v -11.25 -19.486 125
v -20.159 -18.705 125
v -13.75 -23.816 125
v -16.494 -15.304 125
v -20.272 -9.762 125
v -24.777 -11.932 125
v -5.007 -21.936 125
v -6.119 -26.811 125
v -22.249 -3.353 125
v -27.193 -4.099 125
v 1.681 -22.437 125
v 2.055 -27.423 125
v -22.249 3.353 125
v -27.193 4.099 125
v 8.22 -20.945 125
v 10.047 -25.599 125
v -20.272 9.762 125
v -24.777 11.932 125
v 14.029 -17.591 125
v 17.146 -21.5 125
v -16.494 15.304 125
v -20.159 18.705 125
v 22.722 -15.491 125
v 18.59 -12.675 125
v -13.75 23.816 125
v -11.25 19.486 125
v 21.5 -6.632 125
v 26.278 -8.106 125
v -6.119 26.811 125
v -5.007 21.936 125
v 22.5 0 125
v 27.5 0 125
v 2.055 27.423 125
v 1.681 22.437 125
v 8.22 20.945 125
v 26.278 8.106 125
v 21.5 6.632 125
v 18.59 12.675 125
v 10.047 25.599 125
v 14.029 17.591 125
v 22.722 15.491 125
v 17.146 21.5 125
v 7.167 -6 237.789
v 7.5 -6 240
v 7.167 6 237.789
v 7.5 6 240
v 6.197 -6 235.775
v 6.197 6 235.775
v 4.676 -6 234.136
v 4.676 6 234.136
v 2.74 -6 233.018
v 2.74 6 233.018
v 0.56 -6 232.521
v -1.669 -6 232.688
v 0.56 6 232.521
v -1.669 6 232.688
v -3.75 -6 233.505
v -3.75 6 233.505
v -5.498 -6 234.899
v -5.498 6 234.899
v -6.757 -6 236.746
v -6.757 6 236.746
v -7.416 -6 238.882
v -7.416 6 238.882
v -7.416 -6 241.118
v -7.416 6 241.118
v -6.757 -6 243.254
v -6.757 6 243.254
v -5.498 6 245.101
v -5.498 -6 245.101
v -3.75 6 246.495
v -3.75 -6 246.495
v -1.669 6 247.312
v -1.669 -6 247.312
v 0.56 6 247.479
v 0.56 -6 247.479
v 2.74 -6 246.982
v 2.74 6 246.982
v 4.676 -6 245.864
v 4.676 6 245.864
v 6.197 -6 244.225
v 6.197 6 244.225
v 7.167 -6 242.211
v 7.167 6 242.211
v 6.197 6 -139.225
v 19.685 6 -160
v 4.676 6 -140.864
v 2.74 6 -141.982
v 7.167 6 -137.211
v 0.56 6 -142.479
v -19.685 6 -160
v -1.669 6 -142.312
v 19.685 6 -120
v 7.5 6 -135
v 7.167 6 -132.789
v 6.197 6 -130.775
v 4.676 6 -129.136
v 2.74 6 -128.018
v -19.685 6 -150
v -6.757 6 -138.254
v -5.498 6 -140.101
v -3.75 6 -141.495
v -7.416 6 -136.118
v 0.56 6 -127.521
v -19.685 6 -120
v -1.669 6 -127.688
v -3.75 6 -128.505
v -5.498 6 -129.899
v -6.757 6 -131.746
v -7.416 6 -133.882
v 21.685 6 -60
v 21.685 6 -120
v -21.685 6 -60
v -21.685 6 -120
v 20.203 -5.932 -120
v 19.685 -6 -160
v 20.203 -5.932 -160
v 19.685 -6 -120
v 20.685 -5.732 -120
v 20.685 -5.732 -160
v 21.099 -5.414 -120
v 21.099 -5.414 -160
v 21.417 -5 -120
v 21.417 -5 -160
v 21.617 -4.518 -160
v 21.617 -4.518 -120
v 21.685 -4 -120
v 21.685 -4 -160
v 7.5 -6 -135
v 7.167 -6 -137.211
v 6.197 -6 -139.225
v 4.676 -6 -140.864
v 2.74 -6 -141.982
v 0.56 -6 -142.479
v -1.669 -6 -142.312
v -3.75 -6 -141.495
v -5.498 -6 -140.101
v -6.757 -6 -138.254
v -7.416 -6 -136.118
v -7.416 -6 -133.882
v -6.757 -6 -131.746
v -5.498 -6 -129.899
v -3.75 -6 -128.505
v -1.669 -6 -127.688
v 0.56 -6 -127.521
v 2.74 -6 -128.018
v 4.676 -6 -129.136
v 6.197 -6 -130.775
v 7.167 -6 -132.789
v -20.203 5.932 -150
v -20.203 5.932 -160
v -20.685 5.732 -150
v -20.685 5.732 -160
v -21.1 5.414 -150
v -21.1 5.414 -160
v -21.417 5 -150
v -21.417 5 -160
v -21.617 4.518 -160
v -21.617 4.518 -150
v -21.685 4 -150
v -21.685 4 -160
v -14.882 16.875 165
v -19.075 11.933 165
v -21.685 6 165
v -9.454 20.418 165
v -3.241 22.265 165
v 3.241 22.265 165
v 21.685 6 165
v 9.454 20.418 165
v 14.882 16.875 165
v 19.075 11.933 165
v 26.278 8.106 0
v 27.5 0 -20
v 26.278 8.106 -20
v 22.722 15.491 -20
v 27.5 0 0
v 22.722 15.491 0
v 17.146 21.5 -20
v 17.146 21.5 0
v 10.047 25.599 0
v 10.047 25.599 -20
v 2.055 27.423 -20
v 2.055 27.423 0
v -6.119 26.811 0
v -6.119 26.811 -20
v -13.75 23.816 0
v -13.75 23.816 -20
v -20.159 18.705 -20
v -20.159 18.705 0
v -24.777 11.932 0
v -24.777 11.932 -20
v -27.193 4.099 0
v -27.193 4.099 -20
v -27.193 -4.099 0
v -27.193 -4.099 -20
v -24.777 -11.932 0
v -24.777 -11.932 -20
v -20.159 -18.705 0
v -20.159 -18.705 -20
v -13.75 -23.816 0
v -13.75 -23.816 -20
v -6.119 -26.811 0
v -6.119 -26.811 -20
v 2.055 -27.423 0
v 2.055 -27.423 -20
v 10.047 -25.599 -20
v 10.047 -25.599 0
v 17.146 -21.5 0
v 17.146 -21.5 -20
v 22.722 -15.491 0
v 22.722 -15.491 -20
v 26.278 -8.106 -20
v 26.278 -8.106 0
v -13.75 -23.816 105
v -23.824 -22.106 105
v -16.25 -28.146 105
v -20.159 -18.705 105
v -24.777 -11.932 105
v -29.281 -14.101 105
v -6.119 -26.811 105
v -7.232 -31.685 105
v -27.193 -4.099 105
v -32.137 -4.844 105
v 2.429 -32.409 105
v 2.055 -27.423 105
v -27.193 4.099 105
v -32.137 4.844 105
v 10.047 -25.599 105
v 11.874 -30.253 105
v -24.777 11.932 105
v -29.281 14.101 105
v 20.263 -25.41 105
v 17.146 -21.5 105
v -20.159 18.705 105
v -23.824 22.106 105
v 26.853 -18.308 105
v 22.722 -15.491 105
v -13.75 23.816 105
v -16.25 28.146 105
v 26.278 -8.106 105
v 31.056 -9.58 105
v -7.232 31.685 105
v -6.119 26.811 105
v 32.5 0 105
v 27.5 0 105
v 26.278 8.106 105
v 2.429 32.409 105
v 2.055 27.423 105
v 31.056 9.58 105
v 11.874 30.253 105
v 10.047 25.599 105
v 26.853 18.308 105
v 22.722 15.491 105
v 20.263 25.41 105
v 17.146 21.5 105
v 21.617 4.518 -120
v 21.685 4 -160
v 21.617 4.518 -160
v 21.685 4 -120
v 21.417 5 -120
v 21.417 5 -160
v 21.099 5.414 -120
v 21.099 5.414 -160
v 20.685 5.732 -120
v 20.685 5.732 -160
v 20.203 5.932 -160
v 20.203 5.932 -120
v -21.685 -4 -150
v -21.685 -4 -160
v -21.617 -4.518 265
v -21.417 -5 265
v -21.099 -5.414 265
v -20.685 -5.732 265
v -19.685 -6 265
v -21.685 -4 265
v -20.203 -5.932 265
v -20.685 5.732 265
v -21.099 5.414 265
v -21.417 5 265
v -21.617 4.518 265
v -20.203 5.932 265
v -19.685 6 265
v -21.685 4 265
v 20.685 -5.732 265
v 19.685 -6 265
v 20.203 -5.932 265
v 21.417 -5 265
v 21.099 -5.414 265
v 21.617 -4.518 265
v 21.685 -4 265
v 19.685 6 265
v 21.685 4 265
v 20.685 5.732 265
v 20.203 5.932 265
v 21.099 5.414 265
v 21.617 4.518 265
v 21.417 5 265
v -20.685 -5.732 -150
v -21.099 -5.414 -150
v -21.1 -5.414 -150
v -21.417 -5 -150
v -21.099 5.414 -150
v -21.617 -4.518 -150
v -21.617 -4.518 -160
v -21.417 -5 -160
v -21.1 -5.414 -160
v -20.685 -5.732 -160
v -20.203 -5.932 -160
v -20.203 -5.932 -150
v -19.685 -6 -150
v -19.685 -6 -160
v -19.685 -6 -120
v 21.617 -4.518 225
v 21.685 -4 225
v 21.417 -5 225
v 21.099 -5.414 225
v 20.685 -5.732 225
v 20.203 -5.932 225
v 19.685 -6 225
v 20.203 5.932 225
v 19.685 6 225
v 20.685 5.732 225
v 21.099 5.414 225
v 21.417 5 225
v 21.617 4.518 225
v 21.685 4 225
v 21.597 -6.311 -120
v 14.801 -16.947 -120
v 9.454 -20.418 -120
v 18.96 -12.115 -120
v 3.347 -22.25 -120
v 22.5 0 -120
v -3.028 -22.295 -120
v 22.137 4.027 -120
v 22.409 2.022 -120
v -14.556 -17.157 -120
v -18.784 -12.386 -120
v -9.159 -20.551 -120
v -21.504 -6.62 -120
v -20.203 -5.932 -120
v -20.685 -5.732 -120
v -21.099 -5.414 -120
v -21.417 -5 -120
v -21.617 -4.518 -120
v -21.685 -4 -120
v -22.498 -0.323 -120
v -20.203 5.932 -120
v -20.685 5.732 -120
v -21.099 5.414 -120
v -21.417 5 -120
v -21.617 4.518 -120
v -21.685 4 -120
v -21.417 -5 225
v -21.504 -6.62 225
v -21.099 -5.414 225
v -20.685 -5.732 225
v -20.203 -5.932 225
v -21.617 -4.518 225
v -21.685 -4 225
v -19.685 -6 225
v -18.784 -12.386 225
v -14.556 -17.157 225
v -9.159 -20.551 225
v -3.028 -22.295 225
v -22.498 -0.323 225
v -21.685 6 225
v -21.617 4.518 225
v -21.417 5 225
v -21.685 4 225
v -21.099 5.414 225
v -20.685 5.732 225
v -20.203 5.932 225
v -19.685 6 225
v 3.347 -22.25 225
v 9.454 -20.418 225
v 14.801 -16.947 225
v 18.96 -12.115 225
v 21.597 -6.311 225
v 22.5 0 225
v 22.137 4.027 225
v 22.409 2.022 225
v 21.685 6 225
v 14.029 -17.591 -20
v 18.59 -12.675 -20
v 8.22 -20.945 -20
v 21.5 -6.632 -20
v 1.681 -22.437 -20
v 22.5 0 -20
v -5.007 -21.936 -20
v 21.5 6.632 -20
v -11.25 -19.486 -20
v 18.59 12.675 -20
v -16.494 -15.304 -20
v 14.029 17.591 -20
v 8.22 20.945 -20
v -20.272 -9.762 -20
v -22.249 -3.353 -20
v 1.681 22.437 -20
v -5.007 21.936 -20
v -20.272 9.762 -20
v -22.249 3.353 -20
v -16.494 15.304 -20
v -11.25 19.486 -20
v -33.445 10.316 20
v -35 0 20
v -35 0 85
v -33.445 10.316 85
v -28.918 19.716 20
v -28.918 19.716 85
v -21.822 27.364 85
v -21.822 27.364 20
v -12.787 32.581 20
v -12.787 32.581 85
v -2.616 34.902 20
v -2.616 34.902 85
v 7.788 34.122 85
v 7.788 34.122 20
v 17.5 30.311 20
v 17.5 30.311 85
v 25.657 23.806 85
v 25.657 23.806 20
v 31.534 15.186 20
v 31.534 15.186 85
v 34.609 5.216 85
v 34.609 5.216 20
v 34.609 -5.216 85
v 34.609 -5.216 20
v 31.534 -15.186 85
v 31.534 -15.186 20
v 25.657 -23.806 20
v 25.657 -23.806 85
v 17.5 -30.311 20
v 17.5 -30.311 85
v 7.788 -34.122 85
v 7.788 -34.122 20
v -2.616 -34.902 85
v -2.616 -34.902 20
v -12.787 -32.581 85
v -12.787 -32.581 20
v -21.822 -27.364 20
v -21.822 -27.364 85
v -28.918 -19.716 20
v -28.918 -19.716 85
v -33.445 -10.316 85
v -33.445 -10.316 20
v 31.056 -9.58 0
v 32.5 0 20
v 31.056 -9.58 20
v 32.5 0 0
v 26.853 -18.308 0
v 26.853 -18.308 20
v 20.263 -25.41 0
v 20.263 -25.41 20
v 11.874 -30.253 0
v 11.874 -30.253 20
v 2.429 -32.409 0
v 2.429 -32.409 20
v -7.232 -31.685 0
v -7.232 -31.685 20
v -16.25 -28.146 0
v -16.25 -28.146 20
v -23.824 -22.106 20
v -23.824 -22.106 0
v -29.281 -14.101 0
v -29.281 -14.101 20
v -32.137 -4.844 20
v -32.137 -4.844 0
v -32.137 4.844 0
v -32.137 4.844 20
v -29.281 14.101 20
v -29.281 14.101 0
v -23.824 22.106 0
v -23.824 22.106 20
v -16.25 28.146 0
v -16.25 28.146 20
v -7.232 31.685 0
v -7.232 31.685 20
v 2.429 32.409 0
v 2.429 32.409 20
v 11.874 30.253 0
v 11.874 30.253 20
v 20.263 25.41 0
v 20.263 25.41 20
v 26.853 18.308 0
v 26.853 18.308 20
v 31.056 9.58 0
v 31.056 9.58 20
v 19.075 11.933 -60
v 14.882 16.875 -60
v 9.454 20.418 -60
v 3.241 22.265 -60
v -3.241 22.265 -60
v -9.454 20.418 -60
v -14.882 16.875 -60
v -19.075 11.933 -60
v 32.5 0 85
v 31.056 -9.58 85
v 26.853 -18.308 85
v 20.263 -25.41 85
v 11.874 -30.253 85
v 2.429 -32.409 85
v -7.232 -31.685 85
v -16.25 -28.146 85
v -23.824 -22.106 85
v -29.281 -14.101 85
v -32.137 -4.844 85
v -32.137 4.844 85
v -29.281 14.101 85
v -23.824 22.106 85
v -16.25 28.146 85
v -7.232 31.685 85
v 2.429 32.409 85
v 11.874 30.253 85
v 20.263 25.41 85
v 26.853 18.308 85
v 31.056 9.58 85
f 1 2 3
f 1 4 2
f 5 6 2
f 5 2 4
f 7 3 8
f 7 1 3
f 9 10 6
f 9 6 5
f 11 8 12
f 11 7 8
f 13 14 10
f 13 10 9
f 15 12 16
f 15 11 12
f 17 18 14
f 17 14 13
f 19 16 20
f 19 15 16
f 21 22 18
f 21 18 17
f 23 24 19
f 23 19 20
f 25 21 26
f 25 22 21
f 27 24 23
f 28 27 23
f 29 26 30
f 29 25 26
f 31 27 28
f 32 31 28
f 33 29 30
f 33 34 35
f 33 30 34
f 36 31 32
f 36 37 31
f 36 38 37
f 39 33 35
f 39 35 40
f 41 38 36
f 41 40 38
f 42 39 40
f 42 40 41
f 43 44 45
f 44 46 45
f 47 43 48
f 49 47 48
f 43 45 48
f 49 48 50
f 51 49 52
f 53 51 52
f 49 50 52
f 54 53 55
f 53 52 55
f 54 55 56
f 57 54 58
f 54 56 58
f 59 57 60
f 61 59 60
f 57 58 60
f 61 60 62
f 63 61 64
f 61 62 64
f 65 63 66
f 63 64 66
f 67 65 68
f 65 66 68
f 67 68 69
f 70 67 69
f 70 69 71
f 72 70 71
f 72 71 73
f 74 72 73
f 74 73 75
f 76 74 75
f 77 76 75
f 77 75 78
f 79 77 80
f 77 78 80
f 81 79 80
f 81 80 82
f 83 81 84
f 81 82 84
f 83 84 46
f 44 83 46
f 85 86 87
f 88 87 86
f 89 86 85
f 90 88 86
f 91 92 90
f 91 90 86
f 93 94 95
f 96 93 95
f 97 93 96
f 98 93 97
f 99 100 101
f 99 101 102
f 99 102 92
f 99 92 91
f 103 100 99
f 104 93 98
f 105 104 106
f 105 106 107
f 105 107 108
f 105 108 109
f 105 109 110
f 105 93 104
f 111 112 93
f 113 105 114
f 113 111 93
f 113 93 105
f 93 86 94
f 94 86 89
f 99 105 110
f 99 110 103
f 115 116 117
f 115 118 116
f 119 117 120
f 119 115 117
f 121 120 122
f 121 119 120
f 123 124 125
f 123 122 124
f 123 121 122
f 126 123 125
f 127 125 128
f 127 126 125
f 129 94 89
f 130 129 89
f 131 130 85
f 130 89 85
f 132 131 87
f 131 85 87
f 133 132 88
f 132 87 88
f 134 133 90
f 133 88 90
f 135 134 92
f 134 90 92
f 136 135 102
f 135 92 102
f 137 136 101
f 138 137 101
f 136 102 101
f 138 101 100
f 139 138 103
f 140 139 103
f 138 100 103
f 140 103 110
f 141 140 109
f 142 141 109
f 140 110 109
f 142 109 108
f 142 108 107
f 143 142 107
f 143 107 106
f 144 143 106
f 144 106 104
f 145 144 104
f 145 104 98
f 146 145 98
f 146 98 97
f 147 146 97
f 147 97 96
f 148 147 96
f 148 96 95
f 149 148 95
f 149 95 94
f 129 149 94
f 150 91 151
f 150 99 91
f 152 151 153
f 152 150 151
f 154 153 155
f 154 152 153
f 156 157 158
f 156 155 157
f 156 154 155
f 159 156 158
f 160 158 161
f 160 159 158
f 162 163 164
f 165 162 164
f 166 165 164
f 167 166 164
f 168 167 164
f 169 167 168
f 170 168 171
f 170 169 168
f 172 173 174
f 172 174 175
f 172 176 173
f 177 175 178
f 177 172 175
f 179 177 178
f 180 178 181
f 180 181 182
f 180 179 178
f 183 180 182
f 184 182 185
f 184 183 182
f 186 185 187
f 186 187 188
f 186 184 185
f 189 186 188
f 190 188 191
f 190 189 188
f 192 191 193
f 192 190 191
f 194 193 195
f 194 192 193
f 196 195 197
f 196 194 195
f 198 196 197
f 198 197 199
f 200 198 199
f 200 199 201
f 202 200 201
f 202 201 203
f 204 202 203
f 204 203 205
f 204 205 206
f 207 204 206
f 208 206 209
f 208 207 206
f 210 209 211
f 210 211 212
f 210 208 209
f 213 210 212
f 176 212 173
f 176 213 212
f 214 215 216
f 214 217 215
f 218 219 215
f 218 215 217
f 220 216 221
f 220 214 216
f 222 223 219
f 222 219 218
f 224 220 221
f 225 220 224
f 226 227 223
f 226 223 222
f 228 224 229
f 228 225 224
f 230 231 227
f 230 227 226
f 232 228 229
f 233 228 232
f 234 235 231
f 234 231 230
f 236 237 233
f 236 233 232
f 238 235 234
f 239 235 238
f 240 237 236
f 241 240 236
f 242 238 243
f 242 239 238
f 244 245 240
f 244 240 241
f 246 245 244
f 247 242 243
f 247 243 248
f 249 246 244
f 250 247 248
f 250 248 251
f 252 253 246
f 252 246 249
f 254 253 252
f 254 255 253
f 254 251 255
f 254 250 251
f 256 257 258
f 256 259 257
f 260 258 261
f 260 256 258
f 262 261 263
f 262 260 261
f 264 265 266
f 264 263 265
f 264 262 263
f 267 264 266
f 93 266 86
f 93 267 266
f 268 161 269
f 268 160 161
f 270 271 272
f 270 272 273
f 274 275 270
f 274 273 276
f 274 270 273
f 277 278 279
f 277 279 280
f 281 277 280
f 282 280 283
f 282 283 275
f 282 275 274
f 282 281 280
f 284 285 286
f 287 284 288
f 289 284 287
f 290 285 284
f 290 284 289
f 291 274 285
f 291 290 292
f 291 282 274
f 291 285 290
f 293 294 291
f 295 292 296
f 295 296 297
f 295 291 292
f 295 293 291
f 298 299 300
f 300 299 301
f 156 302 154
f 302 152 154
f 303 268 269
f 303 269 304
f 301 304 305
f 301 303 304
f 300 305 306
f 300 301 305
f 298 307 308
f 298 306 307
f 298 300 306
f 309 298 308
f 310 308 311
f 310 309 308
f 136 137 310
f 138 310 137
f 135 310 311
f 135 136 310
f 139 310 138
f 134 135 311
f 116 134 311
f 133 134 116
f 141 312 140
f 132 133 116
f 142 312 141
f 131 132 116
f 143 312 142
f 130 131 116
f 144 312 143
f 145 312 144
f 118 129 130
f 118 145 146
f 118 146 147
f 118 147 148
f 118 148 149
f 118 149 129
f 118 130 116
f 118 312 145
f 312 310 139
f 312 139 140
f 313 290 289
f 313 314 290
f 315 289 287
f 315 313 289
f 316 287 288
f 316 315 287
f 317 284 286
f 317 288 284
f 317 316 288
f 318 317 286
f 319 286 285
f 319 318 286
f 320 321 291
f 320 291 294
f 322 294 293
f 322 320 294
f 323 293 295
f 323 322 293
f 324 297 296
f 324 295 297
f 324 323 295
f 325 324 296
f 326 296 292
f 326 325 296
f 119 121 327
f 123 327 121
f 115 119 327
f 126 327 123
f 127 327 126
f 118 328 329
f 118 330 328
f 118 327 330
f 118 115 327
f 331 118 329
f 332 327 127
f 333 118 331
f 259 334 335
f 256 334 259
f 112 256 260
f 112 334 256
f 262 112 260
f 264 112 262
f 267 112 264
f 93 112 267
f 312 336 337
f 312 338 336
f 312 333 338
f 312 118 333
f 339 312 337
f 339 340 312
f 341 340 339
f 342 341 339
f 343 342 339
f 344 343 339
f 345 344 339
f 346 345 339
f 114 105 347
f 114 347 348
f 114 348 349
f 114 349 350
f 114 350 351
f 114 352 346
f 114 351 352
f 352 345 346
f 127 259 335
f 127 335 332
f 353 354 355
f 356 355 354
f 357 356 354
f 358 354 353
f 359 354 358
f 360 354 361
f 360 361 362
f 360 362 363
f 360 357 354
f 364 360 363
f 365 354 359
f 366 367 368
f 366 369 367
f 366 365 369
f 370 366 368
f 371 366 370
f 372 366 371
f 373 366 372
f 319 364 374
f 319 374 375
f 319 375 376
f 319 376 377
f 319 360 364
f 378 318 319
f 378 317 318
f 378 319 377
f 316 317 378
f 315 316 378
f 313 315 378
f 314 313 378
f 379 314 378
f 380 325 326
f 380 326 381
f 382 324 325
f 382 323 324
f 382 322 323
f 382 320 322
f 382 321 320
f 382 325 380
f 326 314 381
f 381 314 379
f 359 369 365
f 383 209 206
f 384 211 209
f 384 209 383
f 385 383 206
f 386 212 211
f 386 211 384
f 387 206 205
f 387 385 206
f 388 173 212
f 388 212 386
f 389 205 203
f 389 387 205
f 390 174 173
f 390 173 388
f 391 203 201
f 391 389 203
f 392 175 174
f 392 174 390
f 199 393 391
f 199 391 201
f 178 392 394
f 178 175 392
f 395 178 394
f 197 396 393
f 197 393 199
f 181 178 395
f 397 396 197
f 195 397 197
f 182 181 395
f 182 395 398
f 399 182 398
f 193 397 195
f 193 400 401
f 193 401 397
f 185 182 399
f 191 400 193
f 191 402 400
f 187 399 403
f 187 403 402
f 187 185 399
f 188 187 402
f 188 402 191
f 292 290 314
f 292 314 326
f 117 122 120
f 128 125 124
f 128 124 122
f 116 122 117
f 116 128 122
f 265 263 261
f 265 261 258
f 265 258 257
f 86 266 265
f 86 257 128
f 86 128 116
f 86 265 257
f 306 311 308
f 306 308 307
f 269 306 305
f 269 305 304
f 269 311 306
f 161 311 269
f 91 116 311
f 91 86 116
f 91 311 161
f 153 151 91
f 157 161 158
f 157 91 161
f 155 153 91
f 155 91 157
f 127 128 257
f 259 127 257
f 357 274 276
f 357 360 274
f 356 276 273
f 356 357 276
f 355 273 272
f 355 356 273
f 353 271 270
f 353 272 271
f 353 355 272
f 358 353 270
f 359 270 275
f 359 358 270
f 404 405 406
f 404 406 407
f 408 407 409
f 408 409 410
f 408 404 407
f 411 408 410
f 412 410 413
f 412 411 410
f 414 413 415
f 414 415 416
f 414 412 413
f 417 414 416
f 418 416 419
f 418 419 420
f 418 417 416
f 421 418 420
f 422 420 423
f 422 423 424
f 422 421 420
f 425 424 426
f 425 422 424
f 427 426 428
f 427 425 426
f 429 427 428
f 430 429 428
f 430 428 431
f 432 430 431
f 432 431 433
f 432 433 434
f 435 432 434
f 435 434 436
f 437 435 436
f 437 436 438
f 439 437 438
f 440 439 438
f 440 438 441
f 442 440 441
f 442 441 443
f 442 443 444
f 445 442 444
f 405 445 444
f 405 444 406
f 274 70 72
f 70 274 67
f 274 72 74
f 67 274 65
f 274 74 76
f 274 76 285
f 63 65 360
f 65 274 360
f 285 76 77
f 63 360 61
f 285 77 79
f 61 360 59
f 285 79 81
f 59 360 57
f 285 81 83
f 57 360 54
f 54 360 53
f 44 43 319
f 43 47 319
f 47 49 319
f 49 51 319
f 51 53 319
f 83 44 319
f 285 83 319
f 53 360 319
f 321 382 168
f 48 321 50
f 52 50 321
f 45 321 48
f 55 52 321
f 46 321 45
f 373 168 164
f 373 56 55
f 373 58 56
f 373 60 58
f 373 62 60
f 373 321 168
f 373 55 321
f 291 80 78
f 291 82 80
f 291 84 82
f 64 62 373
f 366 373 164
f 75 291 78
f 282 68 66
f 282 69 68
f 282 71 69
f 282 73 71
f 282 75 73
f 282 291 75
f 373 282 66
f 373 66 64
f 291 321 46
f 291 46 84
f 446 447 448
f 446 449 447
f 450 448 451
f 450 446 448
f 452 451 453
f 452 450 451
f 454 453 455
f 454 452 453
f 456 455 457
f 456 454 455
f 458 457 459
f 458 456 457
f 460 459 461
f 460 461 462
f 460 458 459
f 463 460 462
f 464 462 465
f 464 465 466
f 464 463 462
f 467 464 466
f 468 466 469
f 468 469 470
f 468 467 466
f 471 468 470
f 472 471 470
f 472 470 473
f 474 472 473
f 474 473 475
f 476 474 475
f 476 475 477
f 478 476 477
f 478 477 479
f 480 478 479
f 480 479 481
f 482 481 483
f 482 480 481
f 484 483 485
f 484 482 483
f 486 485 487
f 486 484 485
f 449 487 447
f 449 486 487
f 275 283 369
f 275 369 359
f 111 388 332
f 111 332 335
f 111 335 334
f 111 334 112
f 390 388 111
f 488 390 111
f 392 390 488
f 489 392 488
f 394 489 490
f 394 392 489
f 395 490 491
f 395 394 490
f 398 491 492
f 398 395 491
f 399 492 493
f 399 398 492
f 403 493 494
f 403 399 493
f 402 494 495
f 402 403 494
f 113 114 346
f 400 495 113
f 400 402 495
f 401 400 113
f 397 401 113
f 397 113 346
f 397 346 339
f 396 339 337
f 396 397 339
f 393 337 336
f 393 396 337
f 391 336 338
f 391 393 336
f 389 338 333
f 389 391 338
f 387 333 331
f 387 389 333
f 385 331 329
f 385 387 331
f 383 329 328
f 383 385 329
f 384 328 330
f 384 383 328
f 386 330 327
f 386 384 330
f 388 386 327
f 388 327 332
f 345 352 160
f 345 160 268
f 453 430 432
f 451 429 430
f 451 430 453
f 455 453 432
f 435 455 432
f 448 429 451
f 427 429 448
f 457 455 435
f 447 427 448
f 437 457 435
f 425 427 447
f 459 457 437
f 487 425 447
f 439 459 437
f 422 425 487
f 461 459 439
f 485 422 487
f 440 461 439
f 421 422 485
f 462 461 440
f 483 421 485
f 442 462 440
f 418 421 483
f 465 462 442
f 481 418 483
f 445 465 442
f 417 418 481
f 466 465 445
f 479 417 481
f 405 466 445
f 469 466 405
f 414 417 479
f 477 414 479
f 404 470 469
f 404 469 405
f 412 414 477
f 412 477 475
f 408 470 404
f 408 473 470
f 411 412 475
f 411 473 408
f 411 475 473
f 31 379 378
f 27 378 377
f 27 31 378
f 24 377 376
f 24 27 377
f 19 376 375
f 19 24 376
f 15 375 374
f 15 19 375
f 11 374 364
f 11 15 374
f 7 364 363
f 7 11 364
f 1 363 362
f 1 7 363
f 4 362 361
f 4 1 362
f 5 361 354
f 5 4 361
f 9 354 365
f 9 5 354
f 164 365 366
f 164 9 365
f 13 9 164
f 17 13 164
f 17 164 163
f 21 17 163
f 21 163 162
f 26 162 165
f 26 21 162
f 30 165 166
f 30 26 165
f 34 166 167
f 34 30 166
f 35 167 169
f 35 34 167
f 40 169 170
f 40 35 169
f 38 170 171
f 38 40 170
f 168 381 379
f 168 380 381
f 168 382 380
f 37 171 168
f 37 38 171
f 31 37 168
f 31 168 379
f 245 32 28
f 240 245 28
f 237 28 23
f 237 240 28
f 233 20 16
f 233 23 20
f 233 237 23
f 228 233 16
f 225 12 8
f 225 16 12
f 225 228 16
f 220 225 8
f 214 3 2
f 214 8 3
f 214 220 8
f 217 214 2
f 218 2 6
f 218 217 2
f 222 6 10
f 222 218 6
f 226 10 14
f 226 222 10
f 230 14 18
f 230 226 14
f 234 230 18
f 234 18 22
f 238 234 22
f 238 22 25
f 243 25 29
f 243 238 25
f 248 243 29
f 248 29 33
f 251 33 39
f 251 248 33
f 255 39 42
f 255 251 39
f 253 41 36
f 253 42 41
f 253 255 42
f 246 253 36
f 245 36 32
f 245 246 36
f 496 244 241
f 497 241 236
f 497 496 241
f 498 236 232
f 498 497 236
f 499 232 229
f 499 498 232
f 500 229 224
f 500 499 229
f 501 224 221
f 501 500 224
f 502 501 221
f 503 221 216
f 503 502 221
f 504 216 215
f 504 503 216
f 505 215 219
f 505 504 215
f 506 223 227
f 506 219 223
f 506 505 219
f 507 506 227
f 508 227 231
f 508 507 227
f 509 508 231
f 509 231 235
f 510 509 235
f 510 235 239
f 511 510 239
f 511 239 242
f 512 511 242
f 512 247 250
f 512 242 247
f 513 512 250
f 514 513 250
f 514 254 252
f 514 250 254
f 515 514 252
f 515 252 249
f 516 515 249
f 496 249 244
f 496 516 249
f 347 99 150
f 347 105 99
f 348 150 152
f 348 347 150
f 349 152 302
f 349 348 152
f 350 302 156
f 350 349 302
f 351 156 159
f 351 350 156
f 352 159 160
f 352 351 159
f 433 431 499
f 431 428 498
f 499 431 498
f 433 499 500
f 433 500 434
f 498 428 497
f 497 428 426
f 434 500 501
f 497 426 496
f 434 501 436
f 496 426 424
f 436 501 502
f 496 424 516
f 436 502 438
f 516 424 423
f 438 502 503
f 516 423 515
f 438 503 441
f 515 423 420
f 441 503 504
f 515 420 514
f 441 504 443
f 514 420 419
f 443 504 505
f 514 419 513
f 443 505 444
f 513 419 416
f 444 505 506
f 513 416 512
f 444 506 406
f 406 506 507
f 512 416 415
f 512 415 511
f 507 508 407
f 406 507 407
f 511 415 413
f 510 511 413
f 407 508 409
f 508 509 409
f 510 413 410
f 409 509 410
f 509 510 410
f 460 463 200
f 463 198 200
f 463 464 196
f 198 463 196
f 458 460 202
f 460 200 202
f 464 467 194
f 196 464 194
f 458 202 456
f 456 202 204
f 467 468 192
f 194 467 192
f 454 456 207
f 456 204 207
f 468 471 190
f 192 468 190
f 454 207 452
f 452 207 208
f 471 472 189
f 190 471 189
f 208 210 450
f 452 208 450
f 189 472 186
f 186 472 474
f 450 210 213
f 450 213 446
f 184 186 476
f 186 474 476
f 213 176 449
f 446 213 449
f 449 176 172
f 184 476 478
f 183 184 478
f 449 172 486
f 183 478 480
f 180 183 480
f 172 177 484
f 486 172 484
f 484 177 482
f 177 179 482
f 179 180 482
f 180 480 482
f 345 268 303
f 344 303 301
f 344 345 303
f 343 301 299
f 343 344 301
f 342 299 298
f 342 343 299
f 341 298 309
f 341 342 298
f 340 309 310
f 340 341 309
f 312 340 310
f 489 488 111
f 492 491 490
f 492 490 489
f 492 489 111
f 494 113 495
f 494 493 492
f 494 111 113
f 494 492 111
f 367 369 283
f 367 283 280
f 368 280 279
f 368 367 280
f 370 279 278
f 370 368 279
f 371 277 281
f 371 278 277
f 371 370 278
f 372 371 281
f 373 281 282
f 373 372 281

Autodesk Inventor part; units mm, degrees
ref_plane "YZ Plane" through (0, 0, 0) normal (1, 0, 0) x (0, 1, 0)
ref_plane "XZ Plane" through (0, 0, 0) normal (0, 1, 0) x (-1, 0, 0)
sketch "Sketch1" plane through (0, 0, 0) normal (0, 0, 1) x (1, 0, 0)
  circle A0 centre (0, 0) radius 32.5
  dimension "d0" = 65
extrude "Extrusion1" add sketch "Sketch1" along normal blind 105
sketch "Sketch2" plane through (0, 0, 105) normal (0, 0, 1) x (1, 0, 0)
  circle A0 centre (0, 0) radius 27.5
  dimension "d3" = 55
extrude "Extrusion2" add sketch "Sketch2" along normal blind 20
sketch "Sketch3" plane through (0, 0, 125) normal (0, 0, 1) x (1, 0, 0)
  circle A0 centre (0, 0) radius 22.5
  dimension "d6" = 45
extrude "Extrusion3" add sketch "Sketch3" along normal blind 100
ref_plane "Work Plane1" through (0, 0, 52.5) normal (0, 0, -1) x (-1, 0, 0)
mirror "Mirror1" about plane through (0, 0, 52.5) normal (0, 0, -1) of "Extrusion3", "Extrusion2"
sketch "Sketch7" plane through (0, 0, -120) normal (0, 0, -1) x (-1, 0, 0)
  point P0 (0, 0)
sketch "Sketch11" plane through (0, 0, 52.5) normal (0, 0, -1) x (-1, 0, 0)
  circle A0 centre (0, 0) radius 35
  dimension "d43" = 70
extrude "Extrusion9" add sketch "Sketch11" along normal mid plane 65
sketch "Sketch12" plane through (0, 0, 225) normal (0, 0, 1) x (1, 0, 0)
  circle A0 centre (0, 0) radius 22.5 projected
  line L0 (-19.6852, 6) -> (19.6852, 6)
  line L1 (21.6852, 4) -> (21.6852, -4)
  line L2 (19.6852, -6) -> (-19.6852, -6)
  line L3 (-21.6852, -4) -> (-21.6852, 4)
  arc A1 (-19.6852, 6) -> (-21.6852, 4) centre (-19.6852, 4) ccw
  arc A2 (-21.6852, -4) -> (-19.6852, -6) centre (-19.6852, -4) ccw
  arc A3 (19.6852, -6) -> (21.6852, -4) centre (19.6852, -4) ccw
  arc A4 (21.6852, 4) -> (19.6852, 6) centre (19.6852, 4) ccw
  point P0 (-21.6852, 6)
  point P1 (21.6852, 6)
  point P2 (21.6852, -6)
  point P3 (-21.6852, -6)
  dimension "d47" = 12
  dimension "d48" = 2
extrude "Extrusion10" add sketch "Sketch12" along normal blind 30 contours L0 A4 L1 A3 L2 A2 L3 A1
sketch "Sketch13" plane through (-19.6852, 6, 225) normal (0, 1, 0) x (1, 0, 0)
  circle A0 centre (19.6852, -15) radius 7.5
  line L0 (39.3705, -30) -> (0, -30) projected
  line L1 (39.3705, 0) -> (39.3705, -30) projected
  point P0 (19.6852, 225)
  dimension "d51" = 15
  dimension "d52" = 15
  dimension "d53" = 19.6852
extrude "Extrusion11" cut sketch "Sketch13" against normal through all
mirror "Mirror3" about plane through (0, 0, 52.5) normal (0, 0, -1) of "Extrusion10", "Extrusion11"
thread "Thread5" size "M55x4" class "6g" standard "ANSI Metric M Profile" full length
sketch "Sketch14" plane through (0, 0, 225) normal (0, 0, 1) x (1, 0, 0)
  arc A0 (-21.6852, -4) -> (-19.6852, -6) centre (-19.6852, -4) ccw projected
  line L0 (-21.6852, -4) -> (-21.6852, 4) projected
  arc A1 (-19.6852, 6) -> (-21.6852, 4) centre (-19.6852, 4) ccw projected
  line L1 (-19.6852, 6) -> (19.6852, 6) projected
  arc A2 (21.6852, 4) -> (19.6852, 6) centre (19.6852, 4) ccw projected
  line L2 (21.6852, 4) -> (21.6852, -4) projected
  arc A3 (19.6852, -6) -> (21.6852, -4) centre (19.6852, -4) ccw projected
  line L3 (19.6852, -6) -> (-19.6852, -6) projected
  circle A4 centre (0, 0) radius 22.5 projected
  line L4 (-19.6852, -6) -> (19.6852, -6) projected
  line L5 (-19.6852, -6) -> (-21.6852, -6)
  line L6 (19.6852, -6) -> (21.6852, -6)
extrude "Extrusion12" [suppressed]
sketch "Sketch15" plane through (0, 0, -120) normal (0, 0, -1) x (-1, 0, 0)
  arc A0 (19.6852, -6) -> (21.6852, -4) centre (19.6852, -4) ccw projected
  line L0 (19.6852, -6) -> (-19.6852, -6) projected
  arc A1 (-21.6852, -4) -> (-19.6852, -6) centre (-19.6852, -4) ccw projected
  line L1 (-21.6852, -4) -> (-21.6852, 4) projected
  arc A2 (-19.6852, 6) -> (-21.6852, 4) centre (-19.6852, 4) ccw projected
  line L2 (-19.6852, 6) -> (19.6852, 6) projected
  arc A3 (21.6852, 4) -> (19.6852, 6) centre (19.6852, 4) ccw projected
  line L3 (21.6852, 4) -> (21.6852, -4) projected
  circle A4 centre (0, 0) radius 22.5 projected
  line L4 (-19.6852, -6) -> (-21.6852, -6)
  line L5 (19.6852, -6) -> (21.6852, -6)
extrude "Extrusion13" [suppressed]
sketch "Sketch16" plane through (0, 0, 255) normal (0, 0, 1) x (1, 0, 0)
  line L0 (-19.6852, -6) -> (19.6852, -6) projected
  arc A0 (19.6852, -6) -> (21.6852, -4) centre (19.6852, -4) ccw projected
  line L1 (21.6852, -4) -> (21.6852, 4) projected
  arc A1 (21.6852, 4) -> (19.6852, 6) centre (19.6852, 4) ccw projected
  line L2 (19.6852, 6) -> (-19.6852, 6) projected
  arc A2 (-19.6852, 6) -> (-21.6852, 4) centre (-19.6852, 4) ccw projected
  line L3 (-21.6852, 4) -> (-21.6852, -4) projected
  arc A3 (-21.6852, -4) -> (-19.6852, -6) centre (-19.6852, -4) ccw projected
  point P0 (0, 0)
extrude "Extrusion14" add sketch "Sketch16" along normal blind 10
sketch "Sketch17" plane through (19.6852, -6, -150) normal (0, 0, -1) x (-1, 0, 0)
  line L0 (39.3705, 0) -> (0, 0) projected
  arc A0 (39.3705, 0) -> (41.3705, 2) centre (39.3705, 2) ccw projected
  line L1 (41.3705, 10) -> (41.3705, 2) projected
  arc A1 (41.3705, 10) -> (39.3705, 12) centre (39.3705, 10) ccw projected
  line L2 (0, 12) -> (39.3705, 12) projected
  arc A2 (0, 12) -> (-2, 10) centre (0, 10) ccw projected
  line L3 (-2, 2) -> (-2, 10) projected
  arc A3 (-2, 2) -> (0, 0) centre (0, 2) ccw projected
  point P0 (19.6852, 6)
extrude "Extrusion15" add sketch "Sketch17" along normal blind 10
sketch "Sketch18" plane through (0, 0, 225) normal (0, 0, 1) x (1, 0, 0)
  arc A0 (-21.6852, -4) -> (-19.6852, -6) centre (-19.6852, -4) ccw projected
  line L0 (-21.6852, -4) -> (-21.6852, 4) projected
  arc A1 (-19.6852, 6) -> (-21.6852, 4) centre (-19.6852, 4) ccw projected
  line L1 (-19.6852, 6) -> (19.6852, 6) projected
  arc A2 (21.6852, 4) -> (19.6852, 6) centre (19.6852, 4) ccw projected
  line L2 (21.6852, 4) -> (21.6852, -4) projected
  arc A3 (19.6852, -6) -> (21.6852, -4) centre (19.6852, -4) ccw projected
  line L3 (19.6852, -6) -> (-19.6852, -6) projected
  circle A4 centre (0, 0) radius 22.5 projected
  line L4 (-19.6852, 6) -> (-21.6852, 6)
  line L5 (19.6852, 6) -> (21.6852, 6)
extrude "Extrusion16" cut sketch "Sketch18" against normal blind 60 contours L4 A4 L5 L1
sketch "Sketch19" plane through (0, 0, -120) normal (0, 0, -1) x (-1, 0, 0)
  arc A0 (19.6852, -6) -> (21.6852, -4) centre (19.6852, -4) ccw projected
  line L0 (19.6852, -6) -> (-19.6852, -6) projected
  arc A1 (-21.6852, -4) -> (-19.6852, -6) centre (-19.6852, -4) ccw projected
  line L1 (-21.6852, -4) -> (-21.6852, 4) projected
  arc A2 (-19.6852, 6) -> (-21.6852, 4) centre (-19.6852, 4) ccw projected
  line L2 (-19.6852, 6) -> (19.6852, 6) projected
  arc A3 (21.6852, 4) -> (19.6852, 6) centre (19.6852, 4) ccw projected
  line L3 (21.6852, 4) -> (21.6852, -4) projected
  circle A4 centre (0, 0) radius 22.5 projected
  line L4 (-19.6852, 6) -> (-21.6852, 6)
  line L5 (19.6852, 6) -> (21.6852, 6)
extrude "Extrusion17" cut sketch "Sketch19" against normal blind 60 contours L2 L4 A4 L5
properties part number "Shaft" material "Steel"
